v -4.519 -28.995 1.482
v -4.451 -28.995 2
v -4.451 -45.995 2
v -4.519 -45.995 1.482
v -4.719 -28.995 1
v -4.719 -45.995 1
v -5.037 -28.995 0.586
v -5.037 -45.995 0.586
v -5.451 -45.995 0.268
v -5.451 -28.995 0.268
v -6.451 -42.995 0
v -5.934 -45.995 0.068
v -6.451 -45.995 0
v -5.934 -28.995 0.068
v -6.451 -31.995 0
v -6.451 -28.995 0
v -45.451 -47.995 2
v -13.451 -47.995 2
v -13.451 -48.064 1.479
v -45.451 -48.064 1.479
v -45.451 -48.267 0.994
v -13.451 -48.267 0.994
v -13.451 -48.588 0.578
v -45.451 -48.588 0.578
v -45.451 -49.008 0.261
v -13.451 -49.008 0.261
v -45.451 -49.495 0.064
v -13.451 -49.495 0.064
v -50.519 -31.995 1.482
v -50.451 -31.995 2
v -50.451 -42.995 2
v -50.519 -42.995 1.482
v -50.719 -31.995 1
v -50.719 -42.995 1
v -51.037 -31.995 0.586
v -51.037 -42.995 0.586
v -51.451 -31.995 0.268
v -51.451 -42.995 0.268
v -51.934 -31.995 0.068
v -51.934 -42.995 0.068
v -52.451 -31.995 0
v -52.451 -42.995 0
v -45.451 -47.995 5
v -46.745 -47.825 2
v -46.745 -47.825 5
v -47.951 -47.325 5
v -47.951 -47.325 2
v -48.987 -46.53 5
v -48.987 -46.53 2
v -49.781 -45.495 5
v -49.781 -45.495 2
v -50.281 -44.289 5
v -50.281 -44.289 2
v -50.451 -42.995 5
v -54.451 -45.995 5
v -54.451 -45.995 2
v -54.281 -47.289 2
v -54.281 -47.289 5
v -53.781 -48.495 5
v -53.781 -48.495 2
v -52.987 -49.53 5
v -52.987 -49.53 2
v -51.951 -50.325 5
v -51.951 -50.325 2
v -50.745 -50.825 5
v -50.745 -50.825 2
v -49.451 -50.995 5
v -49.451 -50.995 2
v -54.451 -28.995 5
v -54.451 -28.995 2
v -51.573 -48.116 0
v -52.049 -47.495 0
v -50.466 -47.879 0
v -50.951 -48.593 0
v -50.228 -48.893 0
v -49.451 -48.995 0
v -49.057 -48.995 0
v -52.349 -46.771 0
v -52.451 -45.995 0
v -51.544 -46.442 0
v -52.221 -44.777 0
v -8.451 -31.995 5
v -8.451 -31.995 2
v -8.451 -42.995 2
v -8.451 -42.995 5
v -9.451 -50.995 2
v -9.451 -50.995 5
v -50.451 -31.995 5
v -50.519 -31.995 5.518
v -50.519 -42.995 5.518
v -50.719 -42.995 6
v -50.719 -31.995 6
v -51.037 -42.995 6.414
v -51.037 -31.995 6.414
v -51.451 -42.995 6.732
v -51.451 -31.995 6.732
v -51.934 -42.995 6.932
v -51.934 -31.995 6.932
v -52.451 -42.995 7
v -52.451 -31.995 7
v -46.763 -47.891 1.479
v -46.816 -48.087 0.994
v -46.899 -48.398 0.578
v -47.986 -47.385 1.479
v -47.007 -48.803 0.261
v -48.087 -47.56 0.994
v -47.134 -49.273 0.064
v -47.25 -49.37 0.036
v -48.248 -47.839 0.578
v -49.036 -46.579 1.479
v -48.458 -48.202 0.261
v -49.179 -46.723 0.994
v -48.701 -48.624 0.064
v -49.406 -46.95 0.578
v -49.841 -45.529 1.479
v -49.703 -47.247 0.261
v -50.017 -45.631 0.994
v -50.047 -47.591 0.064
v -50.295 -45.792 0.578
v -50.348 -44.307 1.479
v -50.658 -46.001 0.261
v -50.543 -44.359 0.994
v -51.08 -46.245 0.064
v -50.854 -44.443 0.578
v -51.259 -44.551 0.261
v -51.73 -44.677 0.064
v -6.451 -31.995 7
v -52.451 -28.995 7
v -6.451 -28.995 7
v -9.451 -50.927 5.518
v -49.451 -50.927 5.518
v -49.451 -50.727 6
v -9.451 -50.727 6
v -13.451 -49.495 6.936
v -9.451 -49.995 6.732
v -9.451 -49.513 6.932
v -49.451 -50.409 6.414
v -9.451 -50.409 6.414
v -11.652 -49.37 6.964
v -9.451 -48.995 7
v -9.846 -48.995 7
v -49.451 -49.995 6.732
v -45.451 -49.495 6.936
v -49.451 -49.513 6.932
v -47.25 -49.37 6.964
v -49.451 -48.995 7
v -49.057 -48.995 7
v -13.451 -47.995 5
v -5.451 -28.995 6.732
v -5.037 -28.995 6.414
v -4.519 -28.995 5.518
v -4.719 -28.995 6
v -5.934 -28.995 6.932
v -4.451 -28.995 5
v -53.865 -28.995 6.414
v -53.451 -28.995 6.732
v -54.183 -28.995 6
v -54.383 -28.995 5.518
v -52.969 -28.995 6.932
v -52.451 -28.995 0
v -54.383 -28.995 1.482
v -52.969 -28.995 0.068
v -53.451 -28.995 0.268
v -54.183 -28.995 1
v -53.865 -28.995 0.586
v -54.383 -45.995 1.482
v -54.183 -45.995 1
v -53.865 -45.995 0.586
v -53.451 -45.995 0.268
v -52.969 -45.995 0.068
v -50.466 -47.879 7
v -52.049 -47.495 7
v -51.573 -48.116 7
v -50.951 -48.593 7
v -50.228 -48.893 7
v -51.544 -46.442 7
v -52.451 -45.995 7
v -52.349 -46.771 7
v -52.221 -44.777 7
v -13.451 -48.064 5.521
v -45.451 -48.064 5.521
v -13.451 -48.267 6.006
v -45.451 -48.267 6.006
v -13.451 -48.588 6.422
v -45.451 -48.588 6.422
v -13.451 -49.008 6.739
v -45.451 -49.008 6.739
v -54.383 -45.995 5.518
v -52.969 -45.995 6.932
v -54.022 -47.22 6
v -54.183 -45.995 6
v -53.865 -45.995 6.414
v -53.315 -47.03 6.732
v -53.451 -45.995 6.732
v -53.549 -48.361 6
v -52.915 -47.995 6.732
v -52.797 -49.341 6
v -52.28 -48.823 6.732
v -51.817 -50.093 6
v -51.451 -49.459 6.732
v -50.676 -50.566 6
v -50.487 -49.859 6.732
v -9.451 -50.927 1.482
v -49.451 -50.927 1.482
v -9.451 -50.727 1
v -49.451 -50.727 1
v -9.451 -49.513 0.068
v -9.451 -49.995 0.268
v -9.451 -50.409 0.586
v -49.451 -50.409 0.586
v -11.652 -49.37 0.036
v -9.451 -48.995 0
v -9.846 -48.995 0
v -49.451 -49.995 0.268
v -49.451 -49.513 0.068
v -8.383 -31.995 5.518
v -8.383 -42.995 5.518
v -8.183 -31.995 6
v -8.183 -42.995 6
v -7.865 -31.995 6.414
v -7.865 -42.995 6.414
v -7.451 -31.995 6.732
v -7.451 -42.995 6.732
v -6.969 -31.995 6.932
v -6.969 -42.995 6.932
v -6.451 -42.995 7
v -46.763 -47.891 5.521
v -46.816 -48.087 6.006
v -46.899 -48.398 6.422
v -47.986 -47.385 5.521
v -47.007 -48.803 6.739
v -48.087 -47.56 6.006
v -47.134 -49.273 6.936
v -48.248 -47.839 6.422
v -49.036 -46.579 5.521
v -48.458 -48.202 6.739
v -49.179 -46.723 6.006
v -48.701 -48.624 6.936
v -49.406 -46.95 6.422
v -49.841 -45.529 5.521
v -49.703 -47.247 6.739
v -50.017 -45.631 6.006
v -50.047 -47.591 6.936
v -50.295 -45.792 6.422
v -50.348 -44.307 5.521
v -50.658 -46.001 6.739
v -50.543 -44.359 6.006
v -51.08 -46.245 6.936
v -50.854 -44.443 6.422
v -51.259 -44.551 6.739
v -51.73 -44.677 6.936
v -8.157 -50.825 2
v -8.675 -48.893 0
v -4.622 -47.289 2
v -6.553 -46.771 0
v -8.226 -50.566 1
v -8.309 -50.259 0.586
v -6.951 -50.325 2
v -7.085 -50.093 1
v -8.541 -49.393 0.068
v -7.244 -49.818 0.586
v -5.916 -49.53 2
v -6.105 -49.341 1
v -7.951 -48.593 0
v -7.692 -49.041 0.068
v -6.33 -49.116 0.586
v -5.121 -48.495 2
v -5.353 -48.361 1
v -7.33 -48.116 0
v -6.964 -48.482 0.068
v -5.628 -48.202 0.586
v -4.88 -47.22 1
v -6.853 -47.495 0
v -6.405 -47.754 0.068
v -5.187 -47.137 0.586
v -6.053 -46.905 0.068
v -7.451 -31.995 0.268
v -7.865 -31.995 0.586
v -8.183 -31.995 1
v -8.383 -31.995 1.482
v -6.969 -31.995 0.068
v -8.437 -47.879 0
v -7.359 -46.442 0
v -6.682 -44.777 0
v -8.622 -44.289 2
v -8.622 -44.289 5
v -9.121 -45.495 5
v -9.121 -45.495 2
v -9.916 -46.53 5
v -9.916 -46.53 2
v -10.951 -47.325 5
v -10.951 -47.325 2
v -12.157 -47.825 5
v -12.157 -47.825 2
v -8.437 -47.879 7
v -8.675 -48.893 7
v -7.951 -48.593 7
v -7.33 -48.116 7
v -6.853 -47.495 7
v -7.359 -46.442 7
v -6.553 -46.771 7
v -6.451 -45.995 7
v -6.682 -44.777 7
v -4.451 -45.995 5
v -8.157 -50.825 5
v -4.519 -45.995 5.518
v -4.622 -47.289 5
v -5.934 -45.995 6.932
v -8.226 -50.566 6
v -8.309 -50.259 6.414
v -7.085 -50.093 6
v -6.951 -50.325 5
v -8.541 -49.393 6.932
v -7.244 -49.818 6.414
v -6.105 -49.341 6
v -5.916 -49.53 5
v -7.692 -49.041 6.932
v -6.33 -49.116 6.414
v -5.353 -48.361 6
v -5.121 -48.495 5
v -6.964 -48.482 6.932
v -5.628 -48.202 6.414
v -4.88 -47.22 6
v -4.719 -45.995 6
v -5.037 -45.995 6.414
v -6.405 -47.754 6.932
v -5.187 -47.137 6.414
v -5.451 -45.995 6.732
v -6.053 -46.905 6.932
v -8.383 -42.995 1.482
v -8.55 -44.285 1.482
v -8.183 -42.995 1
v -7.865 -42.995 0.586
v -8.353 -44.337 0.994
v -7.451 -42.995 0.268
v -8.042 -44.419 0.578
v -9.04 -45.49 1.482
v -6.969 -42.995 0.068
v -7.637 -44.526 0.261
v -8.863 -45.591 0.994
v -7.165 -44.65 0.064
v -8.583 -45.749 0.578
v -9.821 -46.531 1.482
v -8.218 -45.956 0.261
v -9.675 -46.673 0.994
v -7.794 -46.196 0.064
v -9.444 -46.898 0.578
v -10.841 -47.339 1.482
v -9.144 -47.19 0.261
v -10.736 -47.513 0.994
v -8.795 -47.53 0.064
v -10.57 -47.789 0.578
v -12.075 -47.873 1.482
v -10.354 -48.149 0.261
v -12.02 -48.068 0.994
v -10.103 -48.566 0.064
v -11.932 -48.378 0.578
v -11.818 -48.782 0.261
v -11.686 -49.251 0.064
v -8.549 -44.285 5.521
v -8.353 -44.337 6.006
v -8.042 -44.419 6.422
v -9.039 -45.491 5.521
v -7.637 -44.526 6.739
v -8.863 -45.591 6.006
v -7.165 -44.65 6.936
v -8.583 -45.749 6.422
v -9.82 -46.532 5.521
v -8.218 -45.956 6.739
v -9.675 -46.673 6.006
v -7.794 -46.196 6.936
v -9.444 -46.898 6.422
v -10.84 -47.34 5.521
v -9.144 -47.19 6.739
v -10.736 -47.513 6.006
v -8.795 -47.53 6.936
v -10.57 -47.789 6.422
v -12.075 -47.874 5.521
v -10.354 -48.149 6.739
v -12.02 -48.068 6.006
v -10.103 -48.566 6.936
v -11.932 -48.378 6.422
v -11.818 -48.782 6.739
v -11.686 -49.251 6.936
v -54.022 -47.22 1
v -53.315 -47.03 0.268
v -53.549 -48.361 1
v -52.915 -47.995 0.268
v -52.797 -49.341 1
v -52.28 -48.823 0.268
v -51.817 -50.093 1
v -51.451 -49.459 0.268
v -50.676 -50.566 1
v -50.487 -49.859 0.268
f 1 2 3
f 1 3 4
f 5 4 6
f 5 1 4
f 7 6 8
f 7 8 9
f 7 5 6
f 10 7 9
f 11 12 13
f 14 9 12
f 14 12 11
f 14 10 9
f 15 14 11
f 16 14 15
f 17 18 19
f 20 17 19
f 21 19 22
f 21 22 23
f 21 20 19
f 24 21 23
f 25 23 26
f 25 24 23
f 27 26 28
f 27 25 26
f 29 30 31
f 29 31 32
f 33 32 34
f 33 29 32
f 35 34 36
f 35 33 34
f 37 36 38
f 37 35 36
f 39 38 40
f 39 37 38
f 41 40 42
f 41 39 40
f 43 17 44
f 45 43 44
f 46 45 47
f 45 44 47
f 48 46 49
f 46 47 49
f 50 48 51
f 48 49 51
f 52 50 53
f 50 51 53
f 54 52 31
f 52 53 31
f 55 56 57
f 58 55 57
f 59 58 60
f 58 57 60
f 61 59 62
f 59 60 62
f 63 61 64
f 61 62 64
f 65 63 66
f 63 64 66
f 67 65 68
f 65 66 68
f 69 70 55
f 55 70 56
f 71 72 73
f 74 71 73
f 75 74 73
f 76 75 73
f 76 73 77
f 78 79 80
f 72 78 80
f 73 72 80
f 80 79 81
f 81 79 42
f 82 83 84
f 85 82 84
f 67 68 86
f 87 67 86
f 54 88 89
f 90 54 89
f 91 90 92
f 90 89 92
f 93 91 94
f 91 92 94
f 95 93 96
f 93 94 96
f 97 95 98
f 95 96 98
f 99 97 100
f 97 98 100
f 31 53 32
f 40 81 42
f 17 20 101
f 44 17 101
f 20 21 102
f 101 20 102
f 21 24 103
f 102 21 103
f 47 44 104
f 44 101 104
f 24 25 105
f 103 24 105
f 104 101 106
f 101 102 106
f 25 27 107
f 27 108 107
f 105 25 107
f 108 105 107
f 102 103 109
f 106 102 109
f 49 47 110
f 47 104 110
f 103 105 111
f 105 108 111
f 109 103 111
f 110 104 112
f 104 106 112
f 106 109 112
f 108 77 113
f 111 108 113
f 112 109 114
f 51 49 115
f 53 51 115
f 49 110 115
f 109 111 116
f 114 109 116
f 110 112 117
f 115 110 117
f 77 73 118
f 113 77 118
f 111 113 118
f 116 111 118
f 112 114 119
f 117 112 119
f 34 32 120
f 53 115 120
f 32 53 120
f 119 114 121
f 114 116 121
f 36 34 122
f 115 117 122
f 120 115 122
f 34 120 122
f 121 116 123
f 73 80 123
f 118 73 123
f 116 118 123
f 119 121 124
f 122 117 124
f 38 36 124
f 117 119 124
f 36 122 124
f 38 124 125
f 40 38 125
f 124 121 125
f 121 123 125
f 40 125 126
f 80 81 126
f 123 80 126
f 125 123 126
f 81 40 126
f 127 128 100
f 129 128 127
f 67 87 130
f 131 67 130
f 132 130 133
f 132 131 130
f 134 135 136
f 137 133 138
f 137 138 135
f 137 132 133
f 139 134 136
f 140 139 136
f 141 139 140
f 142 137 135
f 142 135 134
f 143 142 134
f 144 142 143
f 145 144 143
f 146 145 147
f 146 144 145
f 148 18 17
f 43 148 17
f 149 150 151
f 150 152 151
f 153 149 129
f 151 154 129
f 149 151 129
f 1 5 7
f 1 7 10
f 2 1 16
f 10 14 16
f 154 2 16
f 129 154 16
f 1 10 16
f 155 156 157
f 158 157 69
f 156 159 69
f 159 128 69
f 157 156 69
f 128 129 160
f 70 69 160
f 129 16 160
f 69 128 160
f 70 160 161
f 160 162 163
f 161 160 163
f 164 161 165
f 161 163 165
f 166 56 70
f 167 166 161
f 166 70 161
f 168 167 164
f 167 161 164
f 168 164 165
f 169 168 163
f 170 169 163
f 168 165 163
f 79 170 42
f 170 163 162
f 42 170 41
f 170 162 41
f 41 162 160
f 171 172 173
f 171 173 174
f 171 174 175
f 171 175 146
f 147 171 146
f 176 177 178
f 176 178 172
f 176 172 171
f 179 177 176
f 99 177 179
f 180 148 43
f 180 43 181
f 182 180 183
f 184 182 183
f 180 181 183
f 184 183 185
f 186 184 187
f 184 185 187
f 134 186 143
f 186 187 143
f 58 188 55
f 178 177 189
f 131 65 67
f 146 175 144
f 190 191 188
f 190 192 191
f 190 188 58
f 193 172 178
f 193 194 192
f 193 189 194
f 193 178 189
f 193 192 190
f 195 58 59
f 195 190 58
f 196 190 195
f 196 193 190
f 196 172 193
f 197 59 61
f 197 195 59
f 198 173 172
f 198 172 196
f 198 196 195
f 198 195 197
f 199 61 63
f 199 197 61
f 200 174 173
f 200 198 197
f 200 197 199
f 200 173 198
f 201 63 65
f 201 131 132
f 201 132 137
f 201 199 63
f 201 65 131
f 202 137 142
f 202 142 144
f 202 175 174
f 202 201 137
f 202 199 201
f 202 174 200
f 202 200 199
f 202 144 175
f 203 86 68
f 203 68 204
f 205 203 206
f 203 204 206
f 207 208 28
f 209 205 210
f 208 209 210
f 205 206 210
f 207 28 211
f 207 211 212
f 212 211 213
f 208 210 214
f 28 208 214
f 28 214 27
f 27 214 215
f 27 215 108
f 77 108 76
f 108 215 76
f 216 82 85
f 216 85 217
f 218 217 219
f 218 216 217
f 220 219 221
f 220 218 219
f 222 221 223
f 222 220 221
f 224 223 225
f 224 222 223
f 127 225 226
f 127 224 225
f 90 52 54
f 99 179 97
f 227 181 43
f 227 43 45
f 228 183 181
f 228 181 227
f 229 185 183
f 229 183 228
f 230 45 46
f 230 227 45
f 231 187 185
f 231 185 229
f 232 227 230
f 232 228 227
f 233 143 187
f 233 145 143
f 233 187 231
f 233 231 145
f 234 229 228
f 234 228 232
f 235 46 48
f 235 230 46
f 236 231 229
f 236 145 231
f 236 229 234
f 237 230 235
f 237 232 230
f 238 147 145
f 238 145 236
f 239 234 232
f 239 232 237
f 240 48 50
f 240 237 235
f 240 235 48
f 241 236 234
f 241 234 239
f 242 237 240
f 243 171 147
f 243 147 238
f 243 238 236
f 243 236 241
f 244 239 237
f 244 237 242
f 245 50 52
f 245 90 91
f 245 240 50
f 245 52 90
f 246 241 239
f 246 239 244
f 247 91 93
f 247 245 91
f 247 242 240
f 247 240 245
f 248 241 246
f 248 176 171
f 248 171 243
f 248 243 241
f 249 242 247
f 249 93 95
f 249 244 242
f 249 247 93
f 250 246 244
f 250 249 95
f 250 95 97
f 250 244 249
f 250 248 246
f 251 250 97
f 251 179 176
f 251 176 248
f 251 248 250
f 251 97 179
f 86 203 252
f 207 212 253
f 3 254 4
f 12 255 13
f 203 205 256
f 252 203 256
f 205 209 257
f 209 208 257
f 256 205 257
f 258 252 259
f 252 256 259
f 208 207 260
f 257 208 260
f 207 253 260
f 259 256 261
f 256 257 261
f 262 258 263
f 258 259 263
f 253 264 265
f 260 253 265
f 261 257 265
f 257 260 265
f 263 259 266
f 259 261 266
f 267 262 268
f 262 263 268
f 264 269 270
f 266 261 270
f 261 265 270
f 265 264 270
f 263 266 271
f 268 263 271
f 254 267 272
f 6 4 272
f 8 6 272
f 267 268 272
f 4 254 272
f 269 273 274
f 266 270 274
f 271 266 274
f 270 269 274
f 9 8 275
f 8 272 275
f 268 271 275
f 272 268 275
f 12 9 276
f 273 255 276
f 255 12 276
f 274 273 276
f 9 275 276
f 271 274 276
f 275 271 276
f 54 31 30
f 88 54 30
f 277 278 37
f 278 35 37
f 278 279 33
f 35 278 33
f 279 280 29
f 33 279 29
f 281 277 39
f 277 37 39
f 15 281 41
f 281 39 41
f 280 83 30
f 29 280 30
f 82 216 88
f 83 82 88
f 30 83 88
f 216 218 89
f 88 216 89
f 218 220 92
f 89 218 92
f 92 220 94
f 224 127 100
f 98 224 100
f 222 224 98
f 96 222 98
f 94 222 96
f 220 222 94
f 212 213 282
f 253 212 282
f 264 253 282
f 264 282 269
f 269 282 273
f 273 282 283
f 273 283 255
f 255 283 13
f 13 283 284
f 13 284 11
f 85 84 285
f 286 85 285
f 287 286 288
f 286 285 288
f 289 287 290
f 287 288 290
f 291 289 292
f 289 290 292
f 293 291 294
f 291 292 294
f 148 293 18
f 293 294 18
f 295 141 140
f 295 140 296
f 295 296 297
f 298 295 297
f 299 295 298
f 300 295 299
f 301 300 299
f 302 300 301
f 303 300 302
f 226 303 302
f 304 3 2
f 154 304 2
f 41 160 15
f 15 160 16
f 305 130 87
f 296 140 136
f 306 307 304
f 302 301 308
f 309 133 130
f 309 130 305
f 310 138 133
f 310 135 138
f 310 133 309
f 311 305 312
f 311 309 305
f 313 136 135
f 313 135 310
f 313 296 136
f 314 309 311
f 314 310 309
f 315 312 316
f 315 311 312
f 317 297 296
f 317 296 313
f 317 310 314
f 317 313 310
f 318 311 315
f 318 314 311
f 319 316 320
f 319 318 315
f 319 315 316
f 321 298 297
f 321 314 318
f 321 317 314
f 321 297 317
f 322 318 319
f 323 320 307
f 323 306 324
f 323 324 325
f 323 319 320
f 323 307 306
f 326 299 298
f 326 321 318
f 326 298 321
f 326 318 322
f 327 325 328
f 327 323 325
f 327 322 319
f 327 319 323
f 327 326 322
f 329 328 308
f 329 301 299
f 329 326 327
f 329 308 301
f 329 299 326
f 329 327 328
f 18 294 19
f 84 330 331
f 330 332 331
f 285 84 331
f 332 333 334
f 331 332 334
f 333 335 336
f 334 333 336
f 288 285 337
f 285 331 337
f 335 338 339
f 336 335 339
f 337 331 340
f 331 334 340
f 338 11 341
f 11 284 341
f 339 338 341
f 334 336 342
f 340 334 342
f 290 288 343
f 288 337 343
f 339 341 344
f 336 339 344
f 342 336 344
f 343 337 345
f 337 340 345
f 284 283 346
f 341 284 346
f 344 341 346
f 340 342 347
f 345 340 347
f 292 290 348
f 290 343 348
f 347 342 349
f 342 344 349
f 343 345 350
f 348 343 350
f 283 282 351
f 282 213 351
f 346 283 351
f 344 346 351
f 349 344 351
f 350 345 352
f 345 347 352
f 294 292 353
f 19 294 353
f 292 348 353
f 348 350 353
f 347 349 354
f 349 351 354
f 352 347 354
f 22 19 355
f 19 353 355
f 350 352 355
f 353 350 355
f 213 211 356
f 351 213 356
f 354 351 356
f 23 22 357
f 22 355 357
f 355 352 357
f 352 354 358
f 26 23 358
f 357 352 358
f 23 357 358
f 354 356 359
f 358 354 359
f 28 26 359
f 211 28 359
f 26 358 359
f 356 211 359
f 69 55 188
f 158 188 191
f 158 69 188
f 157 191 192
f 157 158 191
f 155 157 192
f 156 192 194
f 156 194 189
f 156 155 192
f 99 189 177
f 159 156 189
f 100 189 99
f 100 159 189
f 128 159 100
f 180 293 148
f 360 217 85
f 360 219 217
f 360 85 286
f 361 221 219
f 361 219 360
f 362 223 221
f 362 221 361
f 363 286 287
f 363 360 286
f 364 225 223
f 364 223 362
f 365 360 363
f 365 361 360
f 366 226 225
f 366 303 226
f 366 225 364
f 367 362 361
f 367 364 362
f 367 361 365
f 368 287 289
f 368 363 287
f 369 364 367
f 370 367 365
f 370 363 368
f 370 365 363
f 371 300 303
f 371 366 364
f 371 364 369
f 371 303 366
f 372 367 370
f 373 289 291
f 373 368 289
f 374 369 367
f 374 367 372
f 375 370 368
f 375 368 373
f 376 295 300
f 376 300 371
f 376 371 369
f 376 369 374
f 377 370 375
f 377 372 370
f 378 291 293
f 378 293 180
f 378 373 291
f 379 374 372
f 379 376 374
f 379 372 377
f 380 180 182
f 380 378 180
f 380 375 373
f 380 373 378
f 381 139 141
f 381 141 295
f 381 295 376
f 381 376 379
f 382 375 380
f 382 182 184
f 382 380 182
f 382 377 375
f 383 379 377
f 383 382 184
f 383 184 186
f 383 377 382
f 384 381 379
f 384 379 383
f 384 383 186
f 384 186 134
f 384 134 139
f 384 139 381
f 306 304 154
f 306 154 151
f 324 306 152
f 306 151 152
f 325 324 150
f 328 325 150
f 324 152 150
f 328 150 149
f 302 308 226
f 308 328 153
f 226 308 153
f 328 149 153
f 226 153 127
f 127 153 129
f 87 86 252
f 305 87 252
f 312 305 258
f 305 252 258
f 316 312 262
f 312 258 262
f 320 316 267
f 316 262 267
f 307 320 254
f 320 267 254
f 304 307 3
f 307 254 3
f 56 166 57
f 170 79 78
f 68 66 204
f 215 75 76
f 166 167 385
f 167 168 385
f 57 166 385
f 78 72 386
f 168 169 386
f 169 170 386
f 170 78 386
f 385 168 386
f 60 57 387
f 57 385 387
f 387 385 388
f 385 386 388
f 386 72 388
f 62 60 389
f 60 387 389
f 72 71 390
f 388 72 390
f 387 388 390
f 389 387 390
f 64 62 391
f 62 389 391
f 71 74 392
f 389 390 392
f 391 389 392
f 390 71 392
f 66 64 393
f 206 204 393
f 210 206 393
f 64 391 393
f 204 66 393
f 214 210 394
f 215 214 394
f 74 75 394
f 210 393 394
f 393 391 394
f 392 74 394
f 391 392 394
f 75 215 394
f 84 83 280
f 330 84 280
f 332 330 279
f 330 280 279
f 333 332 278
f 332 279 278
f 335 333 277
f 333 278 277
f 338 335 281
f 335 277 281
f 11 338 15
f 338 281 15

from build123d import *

# Parameters (mm, degrees)
F1_DEPTH     = 7
F2_T1_DEPTH  = 32
F2_T3_DEPTH  = 40
F2_T5_DEPTH  = 22
F2_T7_DEPTH  = 11
F2_T10_ANGLE = 90
F2_T12_ANGLE = 90
F2_T14_ANGLE = 90
F2_T16_ANGLE = 90
F2_T18_ANGLE = 90
F2_T20_ANGLE = 90
F2_T22_ANGLE = 90
F2_T24_ANGLE = 90


# Not quite as in the source:
# - a fillet or chamfer that OpenCascade refuses, or shapes differently, is made with other operations: its cross-section is extruded or revolved along the edge and cut away or added


with BuildPart() as f1:
    # F0 (on Top) → F1 (new body)
    with BuildSketch(Plane.XY):
        with BuildLine():
            Line((-4.4512270018, -28.9949133558), (-54.4512270018, -28.9949133558))
            Line((-54.4512270018, -28.9949133558), (-54.4512270018, -45.9949133558))
            ThreePointArc((-54.4512270018, -45.9949133558), (-52.9867609078, -49.5304472618), (-49.4512270018, -50.9949133558))
            Line((-49.4512270018, -50.9949133558), (-9.4512270018, -50.9949133558))
            ThreePointArc((-9.4512270018, -50.9949133558), (-5.9156930959, -49.5304472618), (-4.4512270018, -45.9949133558))
            Line((-4.4512270018, -45.9949133558), (-4.4512270018, -28.9949133558))
        make_face()
        with BuildLine():
            Line((-50.4512270018, -42.9949133558), (-50.4512270018, -31.9949133558))
            Line((-50.4512270018, -31.9949133558), (-8.4512270018, -31.9949133558))
            Line((-8.4512270018, -31.9949133558), (-8.4512270018, -42.9949133558))
            ThreePointArc((-8.4512270018, -42.9949133558), (-9.9156930959, -46.5304472618), (-13.4512270018, -47.9949133558))
            Line((-13.4512270018, -47.9949133558), (-45.4512270018, -47.9949133558))
            ThreePointArc((-45.4512270018, -47.9949133558), (-48.9867609078, -46.5304472618), (-50.4512270018, -42.9949133558))
        make_face(mode=Mode.SUBTRACT)
    extrude(amount=F1_DEPTH)

    # F2: fillet of radius 2 on 4 edges, made by hand

    # F2_s2 → F2_t1 (cut)
    with BuildSketch(Plane.YZ.offset(-45.4512270018)):
        with BuildLine():
            ThreePointArc((-47.9949133558, 5), (-48.5806997934, 6.4142135624), (-49.9949133558, 7))
            Line((-49.9949133558, 7), (-47.9949133558, 7))
            Line((-47.9949133558, 7), (-47.9949133558, 5))
        make_face()
        with BuildLine():
            ThreePointArc((-47.9949133558, 2), (-48.5806997934, 0.5857864376), (-49.9949133558, 0))
            Line((-49.9949133558, 0), (-47.9949133558, 0))
            Line((-47.9949133558, 0), (-47.9949133558, 2))
        make_face()
    extrude(amount=F2_T1_DEPTH, mode=Mode.SUBTRACT)

    # F2_s4 → F2_t3 (cut)
    with BuildSketch(Plane.YZ.offset(-49.4512270018)):
        with BuildLine():
            ThreePointArc((-50.9949133558, 5), (-50.4091269182, 6.4142135624), (-48.9949133558, 7))
            Line((-48.9949133558, 7), (-50.9949133558, 7))
            Line((-50.9949133558, 7), (-50.9949133558, 5))
        make_face()
        with BuildLine():
            ThreePointArc((-50.9949133558, 2), (-50.4091269182, 0.5857864376), (-48.9949133558, 0))
            Line((-48.9949133558, 0), (-50.9949133558, 0))
            Line((-50.9949133558, 0), (-50.9949133558, 2))
        make_face()
    extrude(amount=F2_T3_DEPTH, mode=Mode.SUBTRACT)

    # F2_s6 → F2_t5 (cut)
    with BuildSketch(Plane.XZ.offset(23.9949133558)):
        with BuildLine():
            ThreePointArc((-54.4512270018, 2), (-53.8654405642, 0.5857864376), (-52.4512270018, 0))
            Line((-52.4512270018, 0), (-54.4512270018, 0))
            Line((-54.4512270018, 0), (-54.4512270018, 2))
        make_face()
        with BuildLine():
            ThreePointArc((-4.4512270018, 2), (-5.0370134395, 0.5857864376), (-6.4512270018, 0))
            Line((-6.4512270018, 0), (-4.4512270018, 0))
            Line((-4.4512270018, 0), (-4.4512270018, 2))
        make_face()
        with BuildLine():
            ThreePointArc((-4.4512270018, 5), (-5.0370134395, 6.4142135624), (-6.4512270018, 7))
            Line((-6.4512270018, 7), (-4.4512270018, 7))
            Line((-4.4512270018, 7), (-4.4512270018, 5))
        make_face()
        with BuildLine():
            ThreePointArc((-54.4512270018, 5), (-53.8654405642, 6.4142135624), (-52.4512270018, 7))
            Line((-52.4512270018, 7), (-54.4512270018, 7))
            Line((-54.4512270018, 7), (-54.4512270018, 5))
        make_face()
    extrude(amount=F2_T5_DEPTH, mode=Mode.SUBTRACT)

    # F2_s8 → F2_t7 (cut)
    with BuildSketch(Plane.XZ.offset(31.9949133558)):
        with BuildLine():
            ThreePointArc((-50.4512270018, 2), (-51.0370134395, 0.5857864376), (-52.4512270018, 0))
            Line((-52.4512270018, 0), (-50.4512270018, 0))
            Line((-50.4512270018, 0), (-50.4512270018, 2))
        make_face()
        with BuildLine():
            ThreePointArc((-8.4512270018, 2), (-7.8654405642, 0.5857864376), (-6.4512270018, 0))
            Line((-6.4512270018, 0), (-8.4512270018, 0))
            Line((-8.4512270018, 0), (-8.4512270018, 2))
        make_face()
        with BuildLine():
            ThreePointArc((-50.4512270018, 5), (-51.0370134395, 6.4142135624), (-52.4512270018, 7))
            Line((-52.4512270018, 7), (-50.4512270018, 7))
            Line((-50.4512270018, 7), (-50.4512270018, 5))
        make_face()
        with BuildLine():
            ThreePointArc((-8.4512270018, 5), (-7.8654405642, 6.4142135624), (-6.4512270018, 7))
            Line((-6.4512270018, 7), (-8.4512270018, 7))
            Line((-8.4512270018, 7), (-8.4512270018, 5))
        make_face()
    extrude(amount=F2_T7_DEPTH, mode=Mode.SUBTRACT)

    # F2_s9 → F2_t10 (revolve, cut)
    with BuildSketch(Plane.XZ.offset(42.9949133558)):
        with BuildLine():
            ThreePointArc((-8.4512270018, 2), (-7.8654405642, 0.5857864376), (-6.4512270018, 0))
            Line((-6.4512270018, 0), (-8.4512270018, 0))
            Line((-8.4512270018, 0), (-8.4512270018, 2))
        make_face()
    revolve(axis=Axis((-13.4512270018, -42.9949133558, 0), (0, 0, -1)), revolution_arc=F2_T10_ANGLE, mode=Mode.SUBTRACT)

    # F2_s11 → F2_t12 (revolve, cut)
    with BuildSketch(Plane.YZ.offset(-45.4512270018)):
        with BuildLine():
            ThreePointArc((-47.9949133558, 2), (-48.5806997934, 0.5857864376), (-49.9949133558, 0))
            Line((-49.9949133558, 0), (-47.9949133558, 0))
            Line((-47.9949133558, 0), (-47.9949133558, 2))
        make_face()
    revolve(axis=Axis((-45.4512270018, -42.9949133558, 0), (0, 0, -1)), revolution_arc=F2_T12_ANGLE, mode=Mode.SUBTRACT)

    # F2_s13 → F2_t14 (revolve, cut)
    with BuildSketch(Plane.XZ.offset(45.9949133558)):
        with BuildLine():
            ThreePointArc((-54.4512270018, 2), (-53.8654405642, 0.5857864376), (-52.4512270018, 0))
            Line((-52.4512270018, 0), (-54.4512270018, 0))
            Line((-54.4512270018, 0), (-54.4512270018, 2))
        make_face()
    revolve(axis=Axis((-49.4512270018, -45.9949133558, 0), (0, 0, 1)), revolution_arc=F2_T14_ANGLE, mode=Mode.SUBTRACT)

    # F2_s15 → F2_t16 (revolve, cut)
    with BuildSketch(Plane.YZ.offset(-9.4512270018)):
        with BuildLine():
            ThreePointArc((-50.9949133558, 2), (-50.4091269182, 0.5857864376), (-48.9949133558, 0))
            Line((-48.9949133558, 0), (-50.9949133558, 0))
            Line((-50.9949133558, 0), (-50.9949133558, 2))
        make_face()
    revolve(axis=Axis((-9.4512270018, -45.9949133558, 0), (0, 0, 1)), revolution_arc=F2_T16_ANGLE, mode=Mode.SUBTRACT)

    # F2_s17 → F2_t18 (revolve, cut)
    with BuildSketch(Plane.XZ.offset(45.9949133558)):
        with BuildLine():
            ThreePointArc((-54.4512270018, 5), (-53.8654405642, 6.4142135624), (-52.4512270018, 7))
            Line((-52.4512270018, 7), (-54.4512270018, 7))
            Line((-54.4512270018, 7), (-54.4512270018, 5))
        make_face()
    revolve(axis=Axis((-49.4512270018, -45.9949133558, 7), (0, 0, 1)), revolution_arc=F2_T18_ANGLE, mode=Mode.SUBTRACT)

    # F2_s19 → F2_t20 (revolve, cut)
    with BuildSketch(Plane.YZ.offset(-9.4512270018)):
        with BuildLine():
            ThreePointArc((-50.9949133558, 5), (-50.4091269182, 6.4142135624), (-48.9949133558, 7))
            Line((-48.9949133558, 7), (-50.9949133558, 7))
            Line((-50.9949133558, 7), (-50.9949133558, 5))
        make_face()
    revolve(axis=Axis((-9.4512270018, -45.9949133558, 7), (0, 0, 1)), revolution_arc=F2_T20_ANGLE, mode=Mode.SUBTRACT)

    # F2_s21 → F2_t22 (revolve, cut)
    with BuildSketch(Plane.XZ.offset(42.9949133558)):
        with BuildLine():
            ThreePointArc((-8.4512270018, 5), (-7.8654405642, 6.4142135624), (-6.4512270018, 7))
            Line((-6.4512270018, 7), (-8.4512270018, 7))
            Line((-8.4512270018, 7), (-8.4512270018, 5))
        make_face()
    revolve(axis=Axis((-13.4512270018, -42.9949133558, 7), (0, 0, -1)), revolution_arc=F2_T22_ANGLE, mode=Mode.SUBTRACT)

    # F2_s23 → F2_t24 (revolve, cut)
    with BuildSketch(Plane.YZ.offset(-45.4512270018)):
        with BuildLine():
            ThreePointArc((-47.9949133558, 5), (-48.5806997934, 6.4142135624), (-49.9949133558, 7))
            Line((-49.9949133558, 7), (-47.9949133558, 7))
            Line((-47.9949133558, 7), (-47.9949133558, 5))
        make_face()
    revolve(axis=Axis((-45.4512270018, -42.9949133558, 7), (0, 0, -1)), revolution_arc=F2_T24_ANGLE, mode=Mode.SUBTRACT)


solid = f1.part
